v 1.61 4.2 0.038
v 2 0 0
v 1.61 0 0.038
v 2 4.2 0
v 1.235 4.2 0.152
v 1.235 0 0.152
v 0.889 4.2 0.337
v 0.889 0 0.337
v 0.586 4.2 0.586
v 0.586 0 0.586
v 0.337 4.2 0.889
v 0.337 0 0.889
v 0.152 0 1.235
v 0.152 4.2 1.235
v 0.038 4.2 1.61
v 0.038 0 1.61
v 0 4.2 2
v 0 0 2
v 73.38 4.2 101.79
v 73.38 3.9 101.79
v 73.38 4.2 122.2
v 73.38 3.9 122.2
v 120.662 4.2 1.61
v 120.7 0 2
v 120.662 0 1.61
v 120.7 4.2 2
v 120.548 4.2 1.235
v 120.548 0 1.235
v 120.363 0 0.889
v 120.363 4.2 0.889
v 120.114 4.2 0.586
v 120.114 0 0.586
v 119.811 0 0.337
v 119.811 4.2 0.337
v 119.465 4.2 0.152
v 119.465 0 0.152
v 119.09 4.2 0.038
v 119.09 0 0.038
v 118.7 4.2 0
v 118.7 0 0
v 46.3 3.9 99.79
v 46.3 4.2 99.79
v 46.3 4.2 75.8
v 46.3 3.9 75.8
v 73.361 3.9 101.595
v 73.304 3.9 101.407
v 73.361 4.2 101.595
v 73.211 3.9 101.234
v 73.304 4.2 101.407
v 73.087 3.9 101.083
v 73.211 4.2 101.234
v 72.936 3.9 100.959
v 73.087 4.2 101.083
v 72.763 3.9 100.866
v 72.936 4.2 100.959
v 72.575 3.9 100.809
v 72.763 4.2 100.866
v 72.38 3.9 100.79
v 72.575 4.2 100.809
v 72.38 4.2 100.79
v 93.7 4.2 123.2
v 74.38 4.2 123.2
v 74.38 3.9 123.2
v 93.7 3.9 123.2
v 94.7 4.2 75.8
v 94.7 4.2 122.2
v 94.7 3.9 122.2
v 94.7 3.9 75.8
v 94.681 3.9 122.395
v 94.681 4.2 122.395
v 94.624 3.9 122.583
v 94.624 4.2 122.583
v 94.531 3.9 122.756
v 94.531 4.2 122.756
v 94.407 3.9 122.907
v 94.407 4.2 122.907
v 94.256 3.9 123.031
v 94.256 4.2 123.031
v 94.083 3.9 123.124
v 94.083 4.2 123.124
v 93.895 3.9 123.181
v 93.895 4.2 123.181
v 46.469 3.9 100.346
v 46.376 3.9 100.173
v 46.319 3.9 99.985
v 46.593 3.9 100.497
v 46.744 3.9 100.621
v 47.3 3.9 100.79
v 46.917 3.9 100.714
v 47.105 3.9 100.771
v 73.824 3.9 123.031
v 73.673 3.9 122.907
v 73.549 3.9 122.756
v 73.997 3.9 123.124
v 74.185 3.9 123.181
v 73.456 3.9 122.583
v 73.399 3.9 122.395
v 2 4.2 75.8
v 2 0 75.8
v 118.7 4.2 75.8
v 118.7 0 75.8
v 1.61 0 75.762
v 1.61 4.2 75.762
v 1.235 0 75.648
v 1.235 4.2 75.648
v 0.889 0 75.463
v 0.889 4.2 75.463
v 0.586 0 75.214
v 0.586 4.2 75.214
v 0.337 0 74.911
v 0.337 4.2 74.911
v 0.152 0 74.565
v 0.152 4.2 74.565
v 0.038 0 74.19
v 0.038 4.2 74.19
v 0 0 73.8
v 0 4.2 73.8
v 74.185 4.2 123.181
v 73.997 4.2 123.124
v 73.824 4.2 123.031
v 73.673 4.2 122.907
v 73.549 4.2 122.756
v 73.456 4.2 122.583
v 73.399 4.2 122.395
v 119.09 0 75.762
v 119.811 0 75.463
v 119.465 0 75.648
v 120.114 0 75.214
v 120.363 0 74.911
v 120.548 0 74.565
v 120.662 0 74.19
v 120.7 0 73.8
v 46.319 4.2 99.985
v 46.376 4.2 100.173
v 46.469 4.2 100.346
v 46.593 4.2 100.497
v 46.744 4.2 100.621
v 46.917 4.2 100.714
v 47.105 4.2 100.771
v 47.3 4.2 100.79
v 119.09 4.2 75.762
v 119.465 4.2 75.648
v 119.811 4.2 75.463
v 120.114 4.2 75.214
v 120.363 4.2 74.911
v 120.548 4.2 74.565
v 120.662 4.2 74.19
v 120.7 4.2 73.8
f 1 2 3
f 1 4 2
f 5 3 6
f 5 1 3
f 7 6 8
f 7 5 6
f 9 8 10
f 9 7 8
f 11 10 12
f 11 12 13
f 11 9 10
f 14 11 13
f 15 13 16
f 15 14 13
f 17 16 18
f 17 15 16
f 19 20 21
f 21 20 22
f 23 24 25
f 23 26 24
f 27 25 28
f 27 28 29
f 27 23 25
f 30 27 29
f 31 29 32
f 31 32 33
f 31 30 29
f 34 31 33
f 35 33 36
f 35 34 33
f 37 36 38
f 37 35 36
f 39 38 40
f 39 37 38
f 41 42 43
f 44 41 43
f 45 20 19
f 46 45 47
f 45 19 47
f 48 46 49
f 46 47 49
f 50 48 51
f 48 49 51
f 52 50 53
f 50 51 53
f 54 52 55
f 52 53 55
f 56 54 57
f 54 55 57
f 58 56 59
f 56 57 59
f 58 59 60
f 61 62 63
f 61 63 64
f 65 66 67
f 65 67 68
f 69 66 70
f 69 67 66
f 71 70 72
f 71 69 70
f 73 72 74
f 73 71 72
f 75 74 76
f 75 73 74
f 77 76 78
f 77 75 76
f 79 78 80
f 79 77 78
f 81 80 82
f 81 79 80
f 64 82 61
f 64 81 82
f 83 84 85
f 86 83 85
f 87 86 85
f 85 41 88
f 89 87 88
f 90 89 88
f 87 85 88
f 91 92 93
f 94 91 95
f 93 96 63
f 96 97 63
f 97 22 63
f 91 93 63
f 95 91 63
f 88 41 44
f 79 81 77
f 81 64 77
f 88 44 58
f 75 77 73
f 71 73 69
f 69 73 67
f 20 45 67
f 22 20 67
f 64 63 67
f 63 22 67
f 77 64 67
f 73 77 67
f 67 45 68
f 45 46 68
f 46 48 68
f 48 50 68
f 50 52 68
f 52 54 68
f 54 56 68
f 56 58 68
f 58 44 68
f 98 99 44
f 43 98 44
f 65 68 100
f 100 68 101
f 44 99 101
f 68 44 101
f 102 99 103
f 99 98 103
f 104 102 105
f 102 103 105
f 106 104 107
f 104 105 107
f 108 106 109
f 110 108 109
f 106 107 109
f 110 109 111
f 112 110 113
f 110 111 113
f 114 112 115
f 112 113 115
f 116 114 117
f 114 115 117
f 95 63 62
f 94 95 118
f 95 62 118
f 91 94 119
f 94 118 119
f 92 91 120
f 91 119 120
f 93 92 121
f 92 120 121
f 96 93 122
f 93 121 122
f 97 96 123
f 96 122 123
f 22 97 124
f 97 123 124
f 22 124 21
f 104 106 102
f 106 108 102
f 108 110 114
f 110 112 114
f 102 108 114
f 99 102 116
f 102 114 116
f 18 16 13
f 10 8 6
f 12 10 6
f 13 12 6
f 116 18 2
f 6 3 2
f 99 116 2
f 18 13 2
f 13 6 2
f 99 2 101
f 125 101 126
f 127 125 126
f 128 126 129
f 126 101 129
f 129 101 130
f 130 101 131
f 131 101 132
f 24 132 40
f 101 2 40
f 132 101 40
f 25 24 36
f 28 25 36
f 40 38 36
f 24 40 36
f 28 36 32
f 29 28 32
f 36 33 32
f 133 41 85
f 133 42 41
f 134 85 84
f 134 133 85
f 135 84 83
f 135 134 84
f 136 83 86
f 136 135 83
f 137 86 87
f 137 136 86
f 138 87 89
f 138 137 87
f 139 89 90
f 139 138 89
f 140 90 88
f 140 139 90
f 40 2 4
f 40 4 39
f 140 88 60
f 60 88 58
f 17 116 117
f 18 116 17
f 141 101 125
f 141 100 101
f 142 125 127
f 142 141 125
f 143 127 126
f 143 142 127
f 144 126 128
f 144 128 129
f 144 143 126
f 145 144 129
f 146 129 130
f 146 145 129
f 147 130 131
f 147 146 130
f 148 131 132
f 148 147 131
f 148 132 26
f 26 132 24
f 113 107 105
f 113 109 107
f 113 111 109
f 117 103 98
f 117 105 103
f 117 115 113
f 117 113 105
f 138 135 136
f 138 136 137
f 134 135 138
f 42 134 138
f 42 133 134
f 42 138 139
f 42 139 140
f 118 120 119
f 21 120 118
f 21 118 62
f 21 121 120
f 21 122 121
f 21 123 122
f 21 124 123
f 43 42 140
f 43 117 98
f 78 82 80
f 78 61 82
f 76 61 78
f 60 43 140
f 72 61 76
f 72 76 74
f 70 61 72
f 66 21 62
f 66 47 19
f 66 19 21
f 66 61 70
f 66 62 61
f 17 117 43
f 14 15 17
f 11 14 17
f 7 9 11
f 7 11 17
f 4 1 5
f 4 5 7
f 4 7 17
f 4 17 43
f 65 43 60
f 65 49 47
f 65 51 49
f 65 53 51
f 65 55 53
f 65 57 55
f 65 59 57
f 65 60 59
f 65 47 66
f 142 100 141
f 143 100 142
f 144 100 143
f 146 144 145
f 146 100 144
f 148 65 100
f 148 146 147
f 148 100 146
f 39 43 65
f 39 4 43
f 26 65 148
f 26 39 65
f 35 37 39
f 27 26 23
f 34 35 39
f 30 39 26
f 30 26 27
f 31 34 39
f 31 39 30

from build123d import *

# Parameters (mm, degrees)
SKETCH1_W           = 120.7
SKETCH1_H           = 75.8
BOSS_EXTRUDE1_DEPTH = 4.2
SKETCH2_W           = 48.4
SKETCH2_H           = 47.4
BOSS_EXTRUDE2_DEPTH = 0.3
SKETCH4_W           = 27.08
SKETCH4_H           = 22.41
CUT_EXTRUDE1_DEPTH  = 0.3
FILLET2_R           = 1
FILLET3_R           = 2


with BuildPart() as part:
    # Sketch1 → Boss-Extrude1 (new body)
    with BuildSketch(Plane(origin=(0, 0, 0), x_dir=(1, 0, 0), z_dir=(0, 1, 0))):
        with Locations((60.35, -37.9)):
            Rectangle(SKETCH1_W, SKETCH1_H)
    extrude(amount=BOSS_EXTRUDE1_DEPTH)

    # Sketch2 → Boss-Extrude2 (add)
    with BuildSketch(Plane(origin=(0, 4.2, 0), x_dir=(1, 0, 0), z_dir=(0, 1, 0))):
        with Locations((70.5, -99.5)):
            Rectangle(SKETCH2_W, SKETCH2_H)
    extrude(amount=-BOSS_EXTRUDE2_DEPTH)

    # Sketch4 → Cut-Extrude1 (cut)
    with BuildSketch(Plane.XZ.offset(-3.9)):
        with Locations((59.84, 111.995)):
            Rectangle(SKETCH4_W, SKETCH4_H)
    extrude(amount=-CUT_EXTRUDE1_DEPTH, mode=Mode.SUBTRACT)

    # Fillet2
    fillet2_edges = [part.edges().sort_by_distance(p)[0] for p in [
        (94.7, 4.05, 123.2),
        (46.3, 4.05, 100.79),
        (73.38, 4.05, 123.2),
        (73.38, 4.05, 100.79),
    ]]
    fillet(fillet2_edges, radius=FILLET2_R)

    # Fillet3
    fillet3_edges = [part.edges().sort_by_distance(p)[0] for p in [
        (0, 2.1, 0),
        (120.7, 2.1, 0),
        (120.7, 2.1, 75.8),
        (0, 2.1, 75.8),
    ]]
    fillet(fillet3_edges, radius=FILLET3_R)


solid = part.part
